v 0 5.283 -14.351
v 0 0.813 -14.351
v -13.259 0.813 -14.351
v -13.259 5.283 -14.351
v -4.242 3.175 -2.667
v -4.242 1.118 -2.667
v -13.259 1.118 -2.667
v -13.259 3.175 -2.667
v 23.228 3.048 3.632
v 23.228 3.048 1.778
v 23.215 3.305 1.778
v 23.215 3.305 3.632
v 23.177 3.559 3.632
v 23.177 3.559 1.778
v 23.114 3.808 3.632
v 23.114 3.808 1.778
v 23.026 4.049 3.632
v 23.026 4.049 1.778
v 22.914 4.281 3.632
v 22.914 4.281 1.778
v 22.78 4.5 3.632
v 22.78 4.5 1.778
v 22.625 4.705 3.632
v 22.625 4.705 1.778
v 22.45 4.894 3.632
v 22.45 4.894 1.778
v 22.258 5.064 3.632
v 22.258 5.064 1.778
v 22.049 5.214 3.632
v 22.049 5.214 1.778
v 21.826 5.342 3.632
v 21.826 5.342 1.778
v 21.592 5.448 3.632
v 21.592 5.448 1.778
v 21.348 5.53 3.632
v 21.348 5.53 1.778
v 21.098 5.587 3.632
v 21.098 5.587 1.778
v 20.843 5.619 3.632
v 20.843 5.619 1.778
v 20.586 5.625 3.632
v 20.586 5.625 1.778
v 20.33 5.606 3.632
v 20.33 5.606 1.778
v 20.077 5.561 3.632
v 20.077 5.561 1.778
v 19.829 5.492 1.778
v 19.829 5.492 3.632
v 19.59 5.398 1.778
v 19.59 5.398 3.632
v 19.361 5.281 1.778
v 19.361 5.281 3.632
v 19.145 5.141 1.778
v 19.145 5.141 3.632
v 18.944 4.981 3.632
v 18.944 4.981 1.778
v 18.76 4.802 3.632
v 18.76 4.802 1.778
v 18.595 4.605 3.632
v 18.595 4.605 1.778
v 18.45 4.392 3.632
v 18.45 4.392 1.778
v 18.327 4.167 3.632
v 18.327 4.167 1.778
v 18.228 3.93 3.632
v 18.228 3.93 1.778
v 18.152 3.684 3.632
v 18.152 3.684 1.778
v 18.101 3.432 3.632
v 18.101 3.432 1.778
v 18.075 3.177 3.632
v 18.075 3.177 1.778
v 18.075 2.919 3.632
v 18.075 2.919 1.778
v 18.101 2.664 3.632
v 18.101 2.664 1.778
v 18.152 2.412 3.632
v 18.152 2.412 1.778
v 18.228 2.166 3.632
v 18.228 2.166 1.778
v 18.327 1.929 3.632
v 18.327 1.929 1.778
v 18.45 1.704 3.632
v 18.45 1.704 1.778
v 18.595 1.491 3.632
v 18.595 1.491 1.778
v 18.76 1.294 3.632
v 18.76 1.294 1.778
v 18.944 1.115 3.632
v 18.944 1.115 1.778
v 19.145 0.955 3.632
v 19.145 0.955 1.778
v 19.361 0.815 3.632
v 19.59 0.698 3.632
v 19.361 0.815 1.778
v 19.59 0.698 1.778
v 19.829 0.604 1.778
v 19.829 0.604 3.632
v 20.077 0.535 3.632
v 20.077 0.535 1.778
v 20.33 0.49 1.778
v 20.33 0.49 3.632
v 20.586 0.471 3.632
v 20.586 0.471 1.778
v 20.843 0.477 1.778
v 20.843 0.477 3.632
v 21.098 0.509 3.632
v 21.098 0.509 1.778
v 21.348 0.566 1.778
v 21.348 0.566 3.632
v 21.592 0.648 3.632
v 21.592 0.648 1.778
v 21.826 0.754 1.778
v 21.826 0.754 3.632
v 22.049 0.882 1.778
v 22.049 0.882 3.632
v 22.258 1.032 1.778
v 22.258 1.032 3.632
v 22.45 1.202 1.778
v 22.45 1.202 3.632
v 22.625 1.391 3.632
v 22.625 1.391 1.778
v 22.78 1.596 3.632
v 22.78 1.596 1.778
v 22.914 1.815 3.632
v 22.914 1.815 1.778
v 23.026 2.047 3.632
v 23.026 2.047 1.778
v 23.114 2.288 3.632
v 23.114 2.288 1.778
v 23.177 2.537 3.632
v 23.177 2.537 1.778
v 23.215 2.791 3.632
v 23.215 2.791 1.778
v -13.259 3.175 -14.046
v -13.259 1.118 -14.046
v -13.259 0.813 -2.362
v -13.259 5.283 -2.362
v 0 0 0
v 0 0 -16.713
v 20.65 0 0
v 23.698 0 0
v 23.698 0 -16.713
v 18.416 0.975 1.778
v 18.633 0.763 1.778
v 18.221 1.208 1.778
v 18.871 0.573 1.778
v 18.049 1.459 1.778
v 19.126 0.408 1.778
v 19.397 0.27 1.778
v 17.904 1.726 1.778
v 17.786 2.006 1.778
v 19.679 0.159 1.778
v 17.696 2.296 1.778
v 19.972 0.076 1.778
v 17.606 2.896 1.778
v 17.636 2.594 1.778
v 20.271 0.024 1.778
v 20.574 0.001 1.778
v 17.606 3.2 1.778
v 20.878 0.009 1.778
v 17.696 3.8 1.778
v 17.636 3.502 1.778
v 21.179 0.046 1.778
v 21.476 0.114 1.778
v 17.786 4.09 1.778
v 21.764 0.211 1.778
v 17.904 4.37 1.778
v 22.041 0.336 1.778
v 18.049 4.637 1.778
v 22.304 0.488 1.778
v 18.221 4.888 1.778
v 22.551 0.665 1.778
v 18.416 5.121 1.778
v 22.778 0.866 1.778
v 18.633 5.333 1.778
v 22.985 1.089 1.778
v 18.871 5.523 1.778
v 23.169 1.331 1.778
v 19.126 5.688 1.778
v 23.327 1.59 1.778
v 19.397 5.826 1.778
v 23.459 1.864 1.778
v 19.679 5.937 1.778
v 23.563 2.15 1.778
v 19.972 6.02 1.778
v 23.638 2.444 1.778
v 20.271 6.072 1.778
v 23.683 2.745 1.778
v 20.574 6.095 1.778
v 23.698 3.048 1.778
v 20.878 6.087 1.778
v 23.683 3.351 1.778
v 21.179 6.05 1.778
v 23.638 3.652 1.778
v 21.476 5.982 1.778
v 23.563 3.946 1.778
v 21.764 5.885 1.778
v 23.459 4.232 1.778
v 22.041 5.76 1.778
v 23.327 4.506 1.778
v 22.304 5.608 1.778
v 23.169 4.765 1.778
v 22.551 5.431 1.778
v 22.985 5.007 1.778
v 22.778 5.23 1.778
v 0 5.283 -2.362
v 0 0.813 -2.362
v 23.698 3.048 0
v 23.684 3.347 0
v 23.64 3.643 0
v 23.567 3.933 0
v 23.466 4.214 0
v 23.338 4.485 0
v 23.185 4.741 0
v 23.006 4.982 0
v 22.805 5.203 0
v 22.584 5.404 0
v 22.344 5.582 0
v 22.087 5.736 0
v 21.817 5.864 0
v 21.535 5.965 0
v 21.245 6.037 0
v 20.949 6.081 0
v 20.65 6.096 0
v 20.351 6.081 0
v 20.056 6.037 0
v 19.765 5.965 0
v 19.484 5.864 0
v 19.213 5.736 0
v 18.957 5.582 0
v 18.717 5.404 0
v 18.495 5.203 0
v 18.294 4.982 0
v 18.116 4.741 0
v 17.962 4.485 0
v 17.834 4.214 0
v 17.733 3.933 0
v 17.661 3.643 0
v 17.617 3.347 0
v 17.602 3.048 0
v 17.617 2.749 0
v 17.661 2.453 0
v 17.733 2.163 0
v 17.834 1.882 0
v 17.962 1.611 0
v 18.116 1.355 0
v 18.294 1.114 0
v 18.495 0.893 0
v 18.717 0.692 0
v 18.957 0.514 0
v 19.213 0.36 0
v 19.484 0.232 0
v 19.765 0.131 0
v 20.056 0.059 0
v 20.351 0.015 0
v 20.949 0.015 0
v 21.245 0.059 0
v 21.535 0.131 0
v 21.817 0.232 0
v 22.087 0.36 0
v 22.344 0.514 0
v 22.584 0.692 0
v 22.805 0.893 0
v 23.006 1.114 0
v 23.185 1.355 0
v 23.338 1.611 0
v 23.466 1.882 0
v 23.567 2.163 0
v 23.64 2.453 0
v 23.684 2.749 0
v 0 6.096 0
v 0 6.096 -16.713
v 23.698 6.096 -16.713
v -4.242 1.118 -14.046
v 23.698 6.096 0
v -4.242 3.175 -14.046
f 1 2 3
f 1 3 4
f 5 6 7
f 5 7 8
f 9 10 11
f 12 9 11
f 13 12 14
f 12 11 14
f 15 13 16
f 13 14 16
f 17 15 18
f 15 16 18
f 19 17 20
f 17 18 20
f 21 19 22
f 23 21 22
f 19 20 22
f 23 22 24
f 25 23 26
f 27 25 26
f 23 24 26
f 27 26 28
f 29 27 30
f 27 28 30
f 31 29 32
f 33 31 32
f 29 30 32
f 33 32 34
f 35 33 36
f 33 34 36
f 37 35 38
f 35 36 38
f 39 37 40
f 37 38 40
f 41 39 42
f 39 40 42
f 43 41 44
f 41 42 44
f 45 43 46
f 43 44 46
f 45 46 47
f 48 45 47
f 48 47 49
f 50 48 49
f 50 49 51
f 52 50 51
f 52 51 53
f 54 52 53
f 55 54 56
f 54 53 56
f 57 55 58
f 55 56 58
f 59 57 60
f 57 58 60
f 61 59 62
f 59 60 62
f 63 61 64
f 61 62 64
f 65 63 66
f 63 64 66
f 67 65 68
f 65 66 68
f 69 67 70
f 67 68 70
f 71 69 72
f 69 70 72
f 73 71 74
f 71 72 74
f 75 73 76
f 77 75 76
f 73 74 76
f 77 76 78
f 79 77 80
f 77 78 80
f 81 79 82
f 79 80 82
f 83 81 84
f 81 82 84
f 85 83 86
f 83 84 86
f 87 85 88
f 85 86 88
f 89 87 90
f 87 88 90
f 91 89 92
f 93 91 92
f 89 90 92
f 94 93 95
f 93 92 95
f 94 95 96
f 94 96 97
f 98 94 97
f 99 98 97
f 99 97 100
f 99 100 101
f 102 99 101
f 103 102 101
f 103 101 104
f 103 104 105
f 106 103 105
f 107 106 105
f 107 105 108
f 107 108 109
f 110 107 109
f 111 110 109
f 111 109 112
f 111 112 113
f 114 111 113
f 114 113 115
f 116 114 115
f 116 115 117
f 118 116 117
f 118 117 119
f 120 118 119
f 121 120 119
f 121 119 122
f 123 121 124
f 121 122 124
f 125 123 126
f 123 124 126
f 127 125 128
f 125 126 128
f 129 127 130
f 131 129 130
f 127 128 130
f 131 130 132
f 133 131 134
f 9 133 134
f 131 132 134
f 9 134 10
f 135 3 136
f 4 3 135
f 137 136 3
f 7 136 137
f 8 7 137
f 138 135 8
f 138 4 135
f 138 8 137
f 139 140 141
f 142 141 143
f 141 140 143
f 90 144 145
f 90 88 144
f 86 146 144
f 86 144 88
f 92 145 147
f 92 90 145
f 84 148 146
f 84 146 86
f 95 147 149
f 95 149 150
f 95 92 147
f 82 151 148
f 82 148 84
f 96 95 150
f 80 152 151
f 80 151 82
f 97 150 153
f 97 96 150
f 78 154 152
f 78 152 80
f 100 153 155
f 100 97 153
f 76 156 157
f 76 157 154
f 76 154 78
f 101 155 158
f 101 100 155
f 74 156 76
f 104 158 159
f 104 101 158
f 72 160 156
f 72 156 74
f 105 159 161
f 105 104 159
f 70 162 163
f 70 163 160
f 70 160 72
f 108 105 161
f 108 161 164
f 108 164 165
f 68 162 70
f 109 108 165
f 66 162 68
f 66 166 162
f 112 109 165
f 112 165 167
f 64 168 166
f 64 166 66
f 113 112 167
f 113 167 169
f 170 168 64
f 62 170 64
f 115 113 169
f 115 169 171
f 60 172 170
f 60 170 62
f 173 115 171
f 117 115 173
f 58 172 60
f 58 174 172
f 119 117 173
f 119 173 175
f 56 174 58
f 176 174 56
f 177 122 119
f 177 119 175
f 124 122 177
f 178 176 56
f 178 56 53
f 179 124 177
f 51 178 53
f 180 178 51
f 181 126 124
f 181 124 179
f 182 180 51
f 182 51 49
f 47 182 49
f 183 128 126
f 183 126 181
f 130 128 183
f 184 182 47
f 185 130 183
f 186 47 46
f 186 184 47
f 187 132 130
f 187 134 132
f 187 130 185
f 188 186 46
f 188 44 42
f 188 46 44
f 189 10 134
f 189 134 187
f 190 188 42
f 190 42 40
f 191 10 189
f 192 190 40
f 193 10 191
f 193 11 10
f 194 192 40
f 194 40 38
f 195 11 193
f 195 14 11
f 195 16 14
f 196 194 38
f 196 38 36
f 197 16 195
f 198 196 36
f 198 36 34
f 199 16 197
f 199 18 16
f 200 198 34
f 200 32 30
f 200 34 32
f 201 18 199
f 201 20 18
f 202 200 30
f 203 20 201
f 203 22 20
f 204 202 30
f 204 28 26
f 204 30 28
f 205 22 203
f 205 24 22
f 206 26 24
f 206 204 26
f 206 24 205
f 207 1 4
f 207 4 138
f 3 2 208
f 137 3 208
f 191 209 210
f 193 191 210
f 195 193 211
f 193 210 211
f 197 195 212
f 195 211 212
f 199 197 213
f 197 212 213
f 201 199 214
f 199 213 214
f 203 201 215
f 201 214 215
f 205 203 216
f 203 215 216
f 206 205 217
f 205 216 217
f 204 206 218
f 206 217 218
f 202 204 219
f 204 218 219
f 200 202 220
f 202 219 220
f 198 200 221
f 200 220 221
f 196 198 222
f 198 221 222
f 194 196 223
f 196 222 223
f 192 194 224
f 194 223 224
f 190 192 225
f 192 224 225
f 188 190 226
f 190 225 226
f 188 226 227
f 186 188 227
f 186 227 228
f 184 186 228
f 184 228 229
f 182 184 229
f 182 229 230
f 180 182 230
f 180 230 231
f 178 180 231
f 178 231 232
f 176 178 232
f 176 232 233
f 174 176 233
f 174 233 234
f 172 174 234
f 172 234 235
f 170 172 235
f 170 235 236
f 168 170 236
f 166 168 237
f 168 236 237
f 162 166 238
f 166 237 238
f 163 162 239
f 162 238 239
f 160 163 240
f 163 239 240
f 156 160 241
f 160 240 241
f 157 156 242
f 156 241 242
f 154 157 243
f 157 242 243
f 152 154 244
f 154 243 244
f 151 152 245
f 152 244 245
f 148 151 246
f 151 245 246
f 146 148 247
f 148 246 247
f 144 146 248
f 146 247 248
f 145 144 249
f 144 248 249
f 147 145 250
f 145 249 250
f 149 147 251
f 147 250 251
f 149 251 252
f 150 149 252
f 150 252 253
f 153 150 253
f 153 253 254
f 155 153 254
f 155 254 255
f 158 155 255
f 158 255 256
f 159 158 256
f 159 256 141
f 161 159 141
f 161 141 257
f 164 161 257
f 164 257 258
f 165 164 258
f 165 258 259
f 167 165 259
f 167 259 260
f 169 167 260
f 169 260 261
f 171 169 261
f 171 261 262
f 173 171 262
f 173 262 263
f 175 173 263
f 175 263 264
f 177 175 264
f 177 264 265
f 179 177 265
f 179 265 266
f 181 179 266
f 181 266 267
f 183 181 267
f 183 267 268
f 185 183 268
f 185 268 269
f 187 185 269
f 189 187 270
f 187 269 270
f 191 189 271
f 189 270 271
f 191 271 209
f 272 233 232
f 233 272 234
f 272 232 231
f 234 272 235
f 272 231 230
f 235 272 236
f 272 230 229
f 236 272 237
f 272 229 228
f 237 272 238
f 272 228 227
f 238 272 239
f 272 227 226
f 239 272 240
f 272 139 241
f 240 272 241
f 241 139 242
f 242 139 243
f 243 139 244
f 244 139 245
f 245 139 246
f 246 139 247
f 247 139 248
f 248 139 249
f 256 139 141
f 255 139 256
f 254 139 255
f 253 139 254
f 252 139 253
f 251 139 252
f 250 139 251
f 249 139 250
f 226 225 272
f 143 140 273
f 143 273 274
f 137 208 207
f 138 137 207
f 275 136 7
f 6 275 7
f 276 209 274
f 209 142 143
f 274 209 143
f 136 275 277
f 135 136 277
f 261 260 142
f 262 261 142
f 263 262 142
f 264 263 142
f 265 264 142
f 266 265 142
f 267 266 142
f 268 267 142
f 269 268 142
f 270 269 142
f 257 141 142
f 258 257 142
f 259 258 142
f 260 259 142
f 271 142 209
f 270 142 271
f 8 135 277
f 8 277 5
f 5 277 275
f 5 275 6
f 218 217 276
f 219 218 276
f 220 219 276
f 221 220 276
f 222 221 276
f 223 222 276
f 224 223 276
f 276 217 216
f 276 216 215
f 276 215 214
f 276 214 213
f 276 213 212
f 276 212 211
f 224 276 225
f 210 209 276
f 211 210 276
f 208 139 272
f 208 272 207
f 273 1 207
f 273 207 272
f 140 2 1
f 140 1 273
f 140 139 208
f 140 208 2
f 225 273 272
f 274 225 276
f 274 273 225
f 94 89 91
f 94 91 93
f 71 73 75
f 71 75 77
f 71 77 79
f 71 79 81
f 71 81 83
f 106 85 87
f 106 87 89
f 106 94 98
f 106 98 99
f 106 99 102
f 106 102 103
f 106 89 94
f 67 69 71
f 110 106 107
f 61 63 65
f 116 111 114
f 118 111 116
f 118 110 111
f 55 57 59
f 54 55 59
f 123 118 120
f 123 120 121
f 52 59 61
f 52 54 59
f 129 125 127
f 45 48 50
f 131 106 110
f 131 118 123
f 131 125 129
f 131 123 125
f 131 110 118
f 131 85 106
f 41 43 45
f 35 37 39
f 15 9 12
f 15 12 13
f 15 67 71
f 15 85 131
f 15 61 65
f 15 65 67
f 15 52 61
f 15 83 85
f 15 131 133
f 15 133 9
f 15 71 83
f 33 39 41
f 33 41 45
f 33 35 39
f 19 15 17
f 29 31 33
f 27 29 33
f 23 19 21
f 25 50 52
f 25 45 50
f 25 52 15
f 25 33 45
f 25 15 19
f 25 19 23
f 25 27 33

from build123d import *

# Parameters (mm, degrees)
SKETCH1_W           = 23.6982
SKETCH1_H           = 16.7132
BOSS_EXTRUDE1_DEPTH = 6.096
SKETCH2_W           = 11.9888
SKETCH2_H           = 4.4704
BOSS_EXTRUDE2_DEPTH = 13.2588
SKETCH3_W           = 11.3792
SKETCH3_H           = 2.0574
CUT_EXTRUDE1_DEPTH  = 9.017
SKETCH4_R           = 3.048
BOSS_EXTRUDE3_DEPTH = 1.778
SKETCH5_R           = 2.5781
BOSS_EXTRUDE4_DEPTH = 1.8542


with BuildPart() as part:
    # Sketch1 → Boss-Extrude1 (new body)
    with BuildSketch(Plane(origin=(0, 0, 0), x_dir=(1, 0, 0), z_dir=(0, 1, 0))):
        with Locations((11.8491, 8.3566)):
            Rectangle(SKETCH1_W, SKETCH1_H)
    extrude(amount=BOSS_EXTRUDE1_DEPTH)

    # Sketch2 → Boss-Extrude2 (add)
    with BuildSketch(Plane.ZY):
        with Locations((-8.3566, 3.048)):
            Rectangle(SKETCH2_W, SKETCH2_H)
    extrude(amount=BOSS_EXTRUDE2_DEPTH)

    # Sketch3 → Cut-Extrude1 (cut)
    with BuildSketch(Plane.ZY.offset(13.2588)):
        with Locations((-8.3566, 2.1463)):
            Rectangle(SKETCH3_W, SKETCH3_H)
    extrude(amount=-CUT_EXTRUDE1_DEPTH, mode=Mode.SUBTRACT)

    # Sketch4 → Boss-Extrude3 (add)
    with BuildSketch(Plane.XY):
        with Locations((20.6502, 3.048)):
            Circle(SKETCH4_R)
    extrude(amount=BOSS_EXTRUDE3_DEPTH)

    # Sketch5 → Boss-Extrude4 (add)
    with BuildSketch(Plane.XY.offset(1.778)):
        with Locations((20.6502, 3.048)):
            Circle(SKETCH5_R)
    extrude(amount=BOSS_EXTRUDE4_DEPTH)


solid = part.part
